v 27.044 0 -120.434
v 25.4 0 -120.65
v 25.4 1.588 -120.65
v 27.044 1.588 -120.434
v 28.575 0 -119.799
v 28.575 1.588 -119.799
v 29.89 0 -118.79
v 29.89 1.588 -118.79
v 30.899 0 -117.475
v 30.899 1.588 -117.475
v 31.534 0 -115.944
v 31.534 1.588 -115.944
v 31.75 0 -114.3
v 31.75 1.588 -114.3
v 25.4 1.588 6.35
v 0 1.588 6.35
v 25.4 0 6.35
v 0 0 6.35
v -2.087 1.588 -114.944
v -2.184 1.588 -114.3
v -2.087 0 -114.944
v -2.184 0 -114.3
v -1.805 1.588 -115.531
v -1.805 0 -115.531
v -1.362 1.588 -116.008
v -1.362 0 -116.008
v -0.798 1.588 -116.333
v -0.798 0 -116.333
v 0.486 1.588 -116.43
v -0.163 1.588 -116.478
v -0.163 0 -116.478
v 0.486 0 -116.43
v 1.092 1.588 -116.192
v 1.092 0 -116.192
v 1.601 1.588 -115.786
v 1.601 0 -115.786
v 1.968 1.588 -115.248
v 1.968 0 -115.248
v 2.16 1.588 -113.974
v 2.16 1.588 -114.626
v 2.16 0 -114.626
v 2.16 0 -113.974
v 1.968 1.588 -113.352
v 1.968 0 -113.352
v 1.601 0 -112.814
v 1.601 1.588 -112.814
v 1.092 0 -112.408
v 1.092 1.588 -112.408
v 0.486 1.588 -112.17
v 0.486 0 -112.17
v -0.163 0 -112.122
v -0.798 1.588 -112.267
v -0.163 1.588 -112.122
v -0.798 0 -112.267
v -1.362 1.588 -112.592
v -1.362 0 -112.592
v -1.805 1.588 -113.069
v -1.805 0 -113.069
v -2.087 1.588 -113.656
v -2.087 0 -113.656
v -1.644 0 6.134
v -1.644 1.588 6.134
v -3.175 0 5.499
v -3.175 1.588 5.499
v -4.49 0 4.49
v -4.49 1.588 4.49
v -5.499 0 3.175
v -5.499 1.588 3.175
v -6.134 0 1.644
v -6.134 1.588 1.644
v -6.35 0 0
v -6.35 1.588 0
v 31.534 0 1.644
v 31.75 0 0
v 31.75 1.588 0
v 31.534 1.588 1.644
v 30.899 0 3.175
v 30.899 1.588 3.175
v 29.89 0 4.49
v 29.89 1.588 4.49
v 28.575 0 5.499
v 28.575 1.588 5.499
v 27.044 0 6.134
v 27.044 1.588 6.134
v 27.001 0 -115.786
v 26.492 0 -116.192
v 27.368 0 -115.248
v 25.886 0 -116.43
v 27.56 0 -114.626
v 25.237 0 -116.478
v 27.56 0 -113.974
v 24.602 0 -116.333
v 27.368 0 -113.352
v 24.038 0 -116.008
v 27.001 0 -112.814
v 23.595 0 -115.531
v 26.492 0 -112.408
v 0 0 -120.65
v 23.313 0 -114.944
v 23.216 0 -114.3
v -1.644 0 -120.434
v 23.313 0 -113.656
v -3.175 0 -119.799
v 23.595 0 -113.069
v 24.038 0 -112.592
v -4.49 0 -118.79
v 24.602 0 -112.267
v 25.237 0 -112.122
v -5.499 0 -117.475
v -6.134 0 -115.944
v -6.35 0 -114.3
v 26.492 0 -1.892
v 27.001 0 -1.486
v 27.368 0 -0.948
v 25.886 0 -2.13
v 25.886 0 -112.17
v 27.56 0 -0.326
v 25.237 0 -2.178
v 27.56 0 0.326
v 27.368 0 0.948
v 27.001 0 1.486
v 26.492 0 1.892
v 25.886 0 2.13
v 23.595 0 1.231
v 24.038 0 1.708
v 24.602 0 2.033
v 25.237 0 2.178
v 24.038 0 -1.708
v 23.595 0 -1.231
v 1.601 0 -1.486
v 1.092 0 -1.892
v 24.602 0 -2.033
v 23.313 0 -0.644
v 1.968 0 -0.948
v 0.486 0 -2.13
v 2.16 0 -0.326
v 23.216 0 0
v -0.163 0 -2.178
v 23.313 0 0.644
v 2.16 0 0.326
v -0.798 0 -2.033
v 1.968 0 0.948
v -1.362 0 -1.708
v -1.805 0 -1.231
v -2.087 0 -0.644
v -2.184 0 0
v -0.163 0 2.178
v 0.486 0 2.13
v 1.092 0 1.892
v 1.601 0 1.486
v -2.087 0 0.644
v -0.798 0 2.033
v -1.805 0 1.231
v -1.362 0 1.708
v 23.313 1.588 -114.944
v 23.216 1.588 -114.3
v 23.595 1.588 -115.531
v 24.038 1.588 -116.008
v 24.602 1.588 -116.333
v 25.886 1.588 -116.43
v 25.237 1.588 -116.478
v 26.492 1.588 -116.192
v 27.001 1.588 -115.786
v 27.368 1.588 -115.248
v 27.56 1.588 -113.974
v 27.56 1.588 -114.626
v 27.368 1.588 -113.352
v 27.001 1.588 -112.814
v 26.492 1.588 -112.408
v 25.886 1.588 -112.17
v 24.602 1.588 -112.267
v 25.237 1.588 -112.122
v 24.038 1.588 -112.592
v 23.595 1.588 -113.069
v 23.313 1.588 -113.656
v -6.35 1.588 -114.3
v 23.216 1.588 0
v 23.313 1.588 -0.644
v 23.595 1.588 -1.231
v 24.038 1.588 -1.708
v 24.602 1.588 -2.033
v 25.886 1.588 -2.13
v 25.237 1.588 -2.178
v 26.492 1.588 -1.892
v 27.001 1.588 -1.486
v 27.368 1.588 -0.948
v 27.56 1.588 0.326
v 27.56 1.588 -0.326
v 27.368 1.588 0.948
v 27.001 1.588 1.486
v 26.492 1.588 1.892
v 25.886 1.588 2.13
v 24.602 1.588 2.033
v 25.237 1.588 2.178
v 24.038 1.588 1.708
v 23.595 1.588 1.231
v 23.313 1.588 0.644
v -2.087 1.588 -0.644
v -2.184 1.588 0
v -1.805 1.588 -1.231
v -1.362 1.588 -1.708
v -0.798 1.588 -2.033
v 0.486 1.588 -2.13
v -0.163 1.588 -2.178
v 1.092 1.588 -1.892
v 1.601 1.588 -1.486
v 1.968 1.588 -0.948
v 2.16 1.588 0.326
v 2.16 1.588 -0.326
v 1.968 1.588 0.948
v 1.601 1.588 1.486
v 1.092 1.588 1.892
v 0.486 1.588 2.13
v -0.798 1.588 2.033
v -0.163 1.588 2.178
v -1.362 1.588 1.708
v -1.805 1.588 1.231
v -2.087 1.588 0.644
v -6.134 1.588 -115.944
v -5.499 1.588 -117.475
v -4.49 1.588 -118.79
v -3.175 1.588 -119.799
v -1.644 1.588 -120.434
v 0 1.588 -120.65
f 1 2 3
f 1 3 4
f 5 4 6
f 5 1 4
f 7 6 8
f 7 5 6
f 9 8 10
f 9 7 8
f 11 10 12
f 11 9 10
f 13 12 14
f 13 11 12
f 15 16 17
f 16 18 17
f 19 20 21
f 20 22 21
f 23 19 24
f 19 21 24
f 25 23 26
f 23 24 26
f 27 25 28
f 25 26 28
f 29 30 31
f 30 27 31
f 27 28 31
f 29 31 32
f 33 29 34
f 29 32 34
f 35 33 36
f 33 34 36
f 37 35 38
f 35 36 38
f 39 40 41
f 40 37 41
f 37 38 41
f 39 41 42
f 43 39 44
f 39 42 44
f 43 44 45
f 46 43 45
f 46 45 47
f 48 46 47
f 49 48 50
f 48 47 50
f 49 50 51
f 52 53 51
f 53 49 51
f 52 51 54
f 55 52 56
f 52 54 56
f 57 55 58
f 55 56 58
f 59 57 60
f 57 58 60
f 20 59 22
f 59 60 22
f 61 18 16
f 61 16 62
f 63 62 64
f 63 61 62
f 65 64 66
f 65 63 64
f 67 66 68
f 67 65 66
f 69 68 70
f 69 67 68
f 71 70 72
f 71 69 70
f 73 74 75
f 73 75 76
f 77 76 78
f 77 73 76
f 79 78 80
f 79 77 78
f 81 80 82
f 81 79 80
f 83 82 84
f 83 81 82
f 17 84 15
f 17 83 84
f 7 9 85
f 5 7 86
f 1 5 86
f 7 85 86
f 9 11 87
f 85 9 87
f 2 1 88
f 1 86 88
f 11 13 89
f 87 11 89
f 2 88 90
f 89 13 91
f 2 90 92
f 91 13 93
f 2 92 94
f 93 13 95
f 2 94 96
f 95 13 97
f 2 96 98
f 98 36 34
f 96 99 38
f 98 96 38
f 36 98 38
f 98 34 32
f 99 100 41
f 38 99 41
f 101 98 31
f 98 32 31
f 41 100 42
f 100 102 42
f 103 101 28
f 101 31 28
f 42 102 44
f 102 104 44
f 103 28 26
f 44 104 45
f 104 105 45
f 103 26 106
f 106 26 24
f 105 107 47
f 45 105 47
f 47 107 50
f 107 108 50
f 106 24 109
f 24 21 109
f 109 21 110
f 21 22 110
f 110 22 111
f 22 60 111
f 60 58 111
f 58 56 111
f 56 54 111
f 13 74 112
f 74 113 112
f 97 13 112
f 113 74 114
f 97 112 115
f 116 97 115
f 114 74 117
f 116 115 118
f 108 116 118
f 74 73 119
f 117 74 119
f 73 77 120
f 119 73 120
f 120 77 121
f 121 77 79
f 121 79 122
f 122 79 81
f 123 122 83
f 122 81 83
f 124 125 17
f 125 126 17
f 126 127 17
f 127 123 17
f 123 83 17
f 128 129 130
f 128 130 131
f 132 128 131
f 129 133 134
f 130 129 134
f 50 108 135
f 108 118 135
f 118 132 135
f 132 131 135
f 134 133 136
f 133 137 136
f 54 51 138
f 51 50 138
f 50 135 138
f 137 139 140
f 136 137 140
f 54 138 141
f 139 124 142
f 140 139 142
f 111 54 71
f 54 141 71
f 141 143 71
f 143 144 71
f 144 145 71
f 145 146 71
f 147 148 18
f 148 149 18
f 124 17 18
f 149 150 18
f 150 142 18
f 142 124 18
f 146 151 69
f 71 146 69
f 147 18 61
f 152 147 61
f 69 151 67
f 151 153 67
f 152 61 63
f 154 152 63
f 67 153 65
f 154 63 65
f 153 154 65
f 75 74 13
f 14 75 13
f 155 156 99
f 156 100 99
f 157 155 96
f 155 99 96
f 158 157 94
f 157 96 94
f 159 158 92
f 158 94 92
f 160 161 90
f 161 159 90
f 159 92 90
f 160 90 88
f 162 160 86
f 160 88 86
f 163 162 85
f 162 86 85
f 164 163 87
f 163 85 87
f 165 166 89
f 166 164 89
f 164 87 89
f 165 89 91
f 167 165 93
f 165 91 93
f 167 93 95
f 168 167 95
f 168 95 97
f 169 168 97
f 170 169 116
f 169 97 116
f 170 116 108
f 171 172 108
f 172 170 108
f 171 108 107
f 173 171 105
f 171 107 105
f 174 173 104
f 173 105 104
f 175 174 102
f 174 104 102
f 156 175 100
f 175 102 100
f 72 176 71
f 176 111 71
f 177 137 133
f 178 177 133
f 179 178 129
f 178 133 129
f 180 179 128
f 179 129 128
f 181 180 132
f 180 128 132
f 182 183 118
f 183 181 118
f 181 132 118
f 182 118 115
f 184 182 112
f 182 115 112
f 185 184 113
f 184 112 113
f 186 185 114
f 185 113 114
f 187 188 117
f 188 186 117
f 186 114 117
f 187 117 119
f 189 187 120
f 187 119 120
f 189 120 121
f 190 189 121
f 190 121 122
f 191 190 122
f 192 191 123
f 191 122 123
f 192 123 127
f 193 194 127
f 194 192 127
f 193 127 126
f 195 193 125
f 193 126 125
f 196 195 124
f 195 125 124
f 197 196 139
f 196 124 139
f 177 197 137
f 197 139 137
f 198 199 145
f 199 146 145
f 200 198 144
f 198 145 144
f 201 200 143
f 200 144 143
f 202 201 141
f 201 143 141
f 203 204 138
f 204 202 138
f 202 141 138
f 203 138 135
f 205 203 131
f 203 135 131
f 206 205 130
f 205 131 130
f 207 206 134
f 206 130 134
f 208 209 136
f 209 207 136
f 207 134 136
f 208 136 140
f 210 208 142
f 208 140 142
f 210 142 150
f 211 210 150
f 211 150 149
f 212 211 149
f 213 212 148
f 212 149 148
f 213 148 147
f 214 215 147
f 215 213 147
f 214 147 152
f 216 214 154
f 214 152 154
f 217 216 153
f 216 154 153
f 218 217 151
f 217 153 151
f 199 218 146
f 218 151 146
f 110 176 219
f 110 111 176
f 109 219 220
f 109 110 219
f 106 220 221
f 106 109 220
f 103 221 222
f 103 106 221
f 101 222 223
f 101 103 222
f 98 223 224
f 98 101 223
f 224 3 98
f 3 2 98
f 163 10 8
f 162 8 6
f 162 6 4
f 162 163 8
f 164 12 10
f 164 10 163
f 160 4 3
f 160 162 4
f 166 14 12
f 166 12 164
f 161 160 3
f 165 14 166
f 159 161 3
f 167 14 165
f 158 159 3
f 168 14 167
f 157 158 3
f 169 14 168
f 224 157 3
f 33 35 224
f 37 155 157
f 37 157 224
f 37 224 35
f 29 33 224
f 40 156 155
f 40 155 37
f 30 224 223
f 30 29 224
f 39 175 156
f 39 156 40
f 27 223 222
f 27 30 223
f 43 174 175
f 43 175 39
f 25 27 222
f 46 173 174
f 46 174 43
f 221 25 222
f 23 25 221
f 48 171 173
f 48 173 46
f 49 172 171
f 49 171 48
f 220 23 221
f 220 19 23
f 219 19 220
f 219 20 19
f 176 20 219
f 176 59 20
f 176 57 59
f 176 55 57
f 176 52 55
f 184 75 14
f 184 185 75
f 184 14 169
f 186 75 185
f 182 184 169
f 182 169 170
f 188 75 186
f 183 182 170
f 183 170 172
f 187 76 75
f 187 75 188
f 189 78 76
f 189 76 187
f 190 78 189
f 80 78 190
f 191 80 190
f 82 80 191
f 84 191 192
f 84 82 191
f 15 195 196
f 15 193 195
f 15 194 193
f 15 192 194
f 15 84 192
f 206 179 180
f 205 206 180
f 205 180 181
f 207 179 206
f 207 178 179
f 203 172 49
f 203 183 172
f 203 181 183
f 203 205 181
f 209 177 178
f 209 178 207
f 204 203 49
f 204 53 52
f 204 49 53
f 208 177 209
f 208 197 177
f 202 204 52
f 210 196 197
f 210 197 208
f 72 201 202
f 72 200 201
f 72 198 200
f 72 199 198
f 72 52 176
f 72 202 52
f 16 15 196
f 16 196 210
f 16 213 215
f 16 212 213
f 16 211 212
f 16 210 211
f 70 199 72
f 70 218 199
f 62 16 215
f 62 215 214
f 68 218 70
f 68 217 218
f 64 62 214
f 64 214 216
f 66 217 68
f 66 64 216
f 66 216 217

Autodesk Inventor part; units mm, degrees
ref_plane "YZ Plane" through (0, 0, 0) normal (1, 0, 0) x (0, 1, 0)
ref_plane "XZ Plane" through (0, 0, 0) normal (0, 1, 0) x (-1, 0, 0)
ref_plane "XY Plane" through (0, 0, 0) normal (0, 0, 1) x (1, 0, 0)
sketch "main" plane through (0, 0, 0) normal (0, 0, 1) x (1, 0, 0)
  circle A0 centre (-11.9584, 56.4908) radius 2.1844
  circle A1 centre (13.4416, 56.4908) radius 2.1844
  circle A2 centre (13.4416, -57.8092) radius 2.1844
  circle A3 centre (-11.9584, -57.8092) radius 2.1844
  arc A4 (19.7916, 56.4908) -> (13.4416, 62.8408) centre (13.4416, 56.4908) ccw
  arc A5 (-11.9584, 62.8408) -> (-18.3084, 56.4908) centre (-11.9584, 56.4908) ccw
  arc A6 (-18.3084, -57.8092) -> (-11.9584, -64.1592) centre (-11.9584, -57.8092) ccw
  arc A7 (13.4416, -64.1592) -> (19.7916, -57.8092) centre (13.4416, -57.8092) ccw
  line L0 (13.4416, 62.8408) -> (-11.9584, 62.8408)
  line L1 (-18.3084, 56.4908) -> (-18.3084, -57.8092)
  line L2 (-11.9584, -64.1592) -> (13.4416, -64.1592)
  line L3 (19.7916, -57.8092) -> (19.7916, 56.4908)
  point P0 (0.7416, -0.6592)
  dimension "d0" = 12.7
  dimension "d1" = 12.7
  dimension "d2" = 12.7
  dimension "d3" = 12.7
sketch "Sketch1" plane through (0, 0, 0) normal (0, 1, 0) x (-1, 0, 0)
  circle A0 centre (-25.4, 0) radius 2.1844
  circle A1 centre (0, 0) radius 2.1844
  circle A2 centre (0, -114.3) radius 2.1844
  circle A3 centre (-25.4, -114.3) radius 2.1844
  arc A4 (6.35, 0) -> (0, 6.35) centre (0, 0) ccw
  arc A5 (-25.4, 6.35) -> (-31.75, 0) centre (-25.4, 0) ccw
  arc A6 (-31.75, -114.3) -> (-25.4, -120.65) centre (-25.4, -114.3) ccw
  arc A7 (0, -120.65) -> (6.35, -114.3) centre (0, -114.3) ccw
  line L0 (0, 6.35) -> (-25.4, 6.35)
  line L1 (-31.75, 0) -> (-31.75, -114.3)
  line L2 (-25.4, -120.65) -> (0, -120.65)
  line L3 (6.35, -114.3) -> (6.35, 0)
extrude "Extrusion1" add sketch "Sketch1" along normal blind 1.5875
properties part number "Brace Gusset" material "Acetal Resin, White"
